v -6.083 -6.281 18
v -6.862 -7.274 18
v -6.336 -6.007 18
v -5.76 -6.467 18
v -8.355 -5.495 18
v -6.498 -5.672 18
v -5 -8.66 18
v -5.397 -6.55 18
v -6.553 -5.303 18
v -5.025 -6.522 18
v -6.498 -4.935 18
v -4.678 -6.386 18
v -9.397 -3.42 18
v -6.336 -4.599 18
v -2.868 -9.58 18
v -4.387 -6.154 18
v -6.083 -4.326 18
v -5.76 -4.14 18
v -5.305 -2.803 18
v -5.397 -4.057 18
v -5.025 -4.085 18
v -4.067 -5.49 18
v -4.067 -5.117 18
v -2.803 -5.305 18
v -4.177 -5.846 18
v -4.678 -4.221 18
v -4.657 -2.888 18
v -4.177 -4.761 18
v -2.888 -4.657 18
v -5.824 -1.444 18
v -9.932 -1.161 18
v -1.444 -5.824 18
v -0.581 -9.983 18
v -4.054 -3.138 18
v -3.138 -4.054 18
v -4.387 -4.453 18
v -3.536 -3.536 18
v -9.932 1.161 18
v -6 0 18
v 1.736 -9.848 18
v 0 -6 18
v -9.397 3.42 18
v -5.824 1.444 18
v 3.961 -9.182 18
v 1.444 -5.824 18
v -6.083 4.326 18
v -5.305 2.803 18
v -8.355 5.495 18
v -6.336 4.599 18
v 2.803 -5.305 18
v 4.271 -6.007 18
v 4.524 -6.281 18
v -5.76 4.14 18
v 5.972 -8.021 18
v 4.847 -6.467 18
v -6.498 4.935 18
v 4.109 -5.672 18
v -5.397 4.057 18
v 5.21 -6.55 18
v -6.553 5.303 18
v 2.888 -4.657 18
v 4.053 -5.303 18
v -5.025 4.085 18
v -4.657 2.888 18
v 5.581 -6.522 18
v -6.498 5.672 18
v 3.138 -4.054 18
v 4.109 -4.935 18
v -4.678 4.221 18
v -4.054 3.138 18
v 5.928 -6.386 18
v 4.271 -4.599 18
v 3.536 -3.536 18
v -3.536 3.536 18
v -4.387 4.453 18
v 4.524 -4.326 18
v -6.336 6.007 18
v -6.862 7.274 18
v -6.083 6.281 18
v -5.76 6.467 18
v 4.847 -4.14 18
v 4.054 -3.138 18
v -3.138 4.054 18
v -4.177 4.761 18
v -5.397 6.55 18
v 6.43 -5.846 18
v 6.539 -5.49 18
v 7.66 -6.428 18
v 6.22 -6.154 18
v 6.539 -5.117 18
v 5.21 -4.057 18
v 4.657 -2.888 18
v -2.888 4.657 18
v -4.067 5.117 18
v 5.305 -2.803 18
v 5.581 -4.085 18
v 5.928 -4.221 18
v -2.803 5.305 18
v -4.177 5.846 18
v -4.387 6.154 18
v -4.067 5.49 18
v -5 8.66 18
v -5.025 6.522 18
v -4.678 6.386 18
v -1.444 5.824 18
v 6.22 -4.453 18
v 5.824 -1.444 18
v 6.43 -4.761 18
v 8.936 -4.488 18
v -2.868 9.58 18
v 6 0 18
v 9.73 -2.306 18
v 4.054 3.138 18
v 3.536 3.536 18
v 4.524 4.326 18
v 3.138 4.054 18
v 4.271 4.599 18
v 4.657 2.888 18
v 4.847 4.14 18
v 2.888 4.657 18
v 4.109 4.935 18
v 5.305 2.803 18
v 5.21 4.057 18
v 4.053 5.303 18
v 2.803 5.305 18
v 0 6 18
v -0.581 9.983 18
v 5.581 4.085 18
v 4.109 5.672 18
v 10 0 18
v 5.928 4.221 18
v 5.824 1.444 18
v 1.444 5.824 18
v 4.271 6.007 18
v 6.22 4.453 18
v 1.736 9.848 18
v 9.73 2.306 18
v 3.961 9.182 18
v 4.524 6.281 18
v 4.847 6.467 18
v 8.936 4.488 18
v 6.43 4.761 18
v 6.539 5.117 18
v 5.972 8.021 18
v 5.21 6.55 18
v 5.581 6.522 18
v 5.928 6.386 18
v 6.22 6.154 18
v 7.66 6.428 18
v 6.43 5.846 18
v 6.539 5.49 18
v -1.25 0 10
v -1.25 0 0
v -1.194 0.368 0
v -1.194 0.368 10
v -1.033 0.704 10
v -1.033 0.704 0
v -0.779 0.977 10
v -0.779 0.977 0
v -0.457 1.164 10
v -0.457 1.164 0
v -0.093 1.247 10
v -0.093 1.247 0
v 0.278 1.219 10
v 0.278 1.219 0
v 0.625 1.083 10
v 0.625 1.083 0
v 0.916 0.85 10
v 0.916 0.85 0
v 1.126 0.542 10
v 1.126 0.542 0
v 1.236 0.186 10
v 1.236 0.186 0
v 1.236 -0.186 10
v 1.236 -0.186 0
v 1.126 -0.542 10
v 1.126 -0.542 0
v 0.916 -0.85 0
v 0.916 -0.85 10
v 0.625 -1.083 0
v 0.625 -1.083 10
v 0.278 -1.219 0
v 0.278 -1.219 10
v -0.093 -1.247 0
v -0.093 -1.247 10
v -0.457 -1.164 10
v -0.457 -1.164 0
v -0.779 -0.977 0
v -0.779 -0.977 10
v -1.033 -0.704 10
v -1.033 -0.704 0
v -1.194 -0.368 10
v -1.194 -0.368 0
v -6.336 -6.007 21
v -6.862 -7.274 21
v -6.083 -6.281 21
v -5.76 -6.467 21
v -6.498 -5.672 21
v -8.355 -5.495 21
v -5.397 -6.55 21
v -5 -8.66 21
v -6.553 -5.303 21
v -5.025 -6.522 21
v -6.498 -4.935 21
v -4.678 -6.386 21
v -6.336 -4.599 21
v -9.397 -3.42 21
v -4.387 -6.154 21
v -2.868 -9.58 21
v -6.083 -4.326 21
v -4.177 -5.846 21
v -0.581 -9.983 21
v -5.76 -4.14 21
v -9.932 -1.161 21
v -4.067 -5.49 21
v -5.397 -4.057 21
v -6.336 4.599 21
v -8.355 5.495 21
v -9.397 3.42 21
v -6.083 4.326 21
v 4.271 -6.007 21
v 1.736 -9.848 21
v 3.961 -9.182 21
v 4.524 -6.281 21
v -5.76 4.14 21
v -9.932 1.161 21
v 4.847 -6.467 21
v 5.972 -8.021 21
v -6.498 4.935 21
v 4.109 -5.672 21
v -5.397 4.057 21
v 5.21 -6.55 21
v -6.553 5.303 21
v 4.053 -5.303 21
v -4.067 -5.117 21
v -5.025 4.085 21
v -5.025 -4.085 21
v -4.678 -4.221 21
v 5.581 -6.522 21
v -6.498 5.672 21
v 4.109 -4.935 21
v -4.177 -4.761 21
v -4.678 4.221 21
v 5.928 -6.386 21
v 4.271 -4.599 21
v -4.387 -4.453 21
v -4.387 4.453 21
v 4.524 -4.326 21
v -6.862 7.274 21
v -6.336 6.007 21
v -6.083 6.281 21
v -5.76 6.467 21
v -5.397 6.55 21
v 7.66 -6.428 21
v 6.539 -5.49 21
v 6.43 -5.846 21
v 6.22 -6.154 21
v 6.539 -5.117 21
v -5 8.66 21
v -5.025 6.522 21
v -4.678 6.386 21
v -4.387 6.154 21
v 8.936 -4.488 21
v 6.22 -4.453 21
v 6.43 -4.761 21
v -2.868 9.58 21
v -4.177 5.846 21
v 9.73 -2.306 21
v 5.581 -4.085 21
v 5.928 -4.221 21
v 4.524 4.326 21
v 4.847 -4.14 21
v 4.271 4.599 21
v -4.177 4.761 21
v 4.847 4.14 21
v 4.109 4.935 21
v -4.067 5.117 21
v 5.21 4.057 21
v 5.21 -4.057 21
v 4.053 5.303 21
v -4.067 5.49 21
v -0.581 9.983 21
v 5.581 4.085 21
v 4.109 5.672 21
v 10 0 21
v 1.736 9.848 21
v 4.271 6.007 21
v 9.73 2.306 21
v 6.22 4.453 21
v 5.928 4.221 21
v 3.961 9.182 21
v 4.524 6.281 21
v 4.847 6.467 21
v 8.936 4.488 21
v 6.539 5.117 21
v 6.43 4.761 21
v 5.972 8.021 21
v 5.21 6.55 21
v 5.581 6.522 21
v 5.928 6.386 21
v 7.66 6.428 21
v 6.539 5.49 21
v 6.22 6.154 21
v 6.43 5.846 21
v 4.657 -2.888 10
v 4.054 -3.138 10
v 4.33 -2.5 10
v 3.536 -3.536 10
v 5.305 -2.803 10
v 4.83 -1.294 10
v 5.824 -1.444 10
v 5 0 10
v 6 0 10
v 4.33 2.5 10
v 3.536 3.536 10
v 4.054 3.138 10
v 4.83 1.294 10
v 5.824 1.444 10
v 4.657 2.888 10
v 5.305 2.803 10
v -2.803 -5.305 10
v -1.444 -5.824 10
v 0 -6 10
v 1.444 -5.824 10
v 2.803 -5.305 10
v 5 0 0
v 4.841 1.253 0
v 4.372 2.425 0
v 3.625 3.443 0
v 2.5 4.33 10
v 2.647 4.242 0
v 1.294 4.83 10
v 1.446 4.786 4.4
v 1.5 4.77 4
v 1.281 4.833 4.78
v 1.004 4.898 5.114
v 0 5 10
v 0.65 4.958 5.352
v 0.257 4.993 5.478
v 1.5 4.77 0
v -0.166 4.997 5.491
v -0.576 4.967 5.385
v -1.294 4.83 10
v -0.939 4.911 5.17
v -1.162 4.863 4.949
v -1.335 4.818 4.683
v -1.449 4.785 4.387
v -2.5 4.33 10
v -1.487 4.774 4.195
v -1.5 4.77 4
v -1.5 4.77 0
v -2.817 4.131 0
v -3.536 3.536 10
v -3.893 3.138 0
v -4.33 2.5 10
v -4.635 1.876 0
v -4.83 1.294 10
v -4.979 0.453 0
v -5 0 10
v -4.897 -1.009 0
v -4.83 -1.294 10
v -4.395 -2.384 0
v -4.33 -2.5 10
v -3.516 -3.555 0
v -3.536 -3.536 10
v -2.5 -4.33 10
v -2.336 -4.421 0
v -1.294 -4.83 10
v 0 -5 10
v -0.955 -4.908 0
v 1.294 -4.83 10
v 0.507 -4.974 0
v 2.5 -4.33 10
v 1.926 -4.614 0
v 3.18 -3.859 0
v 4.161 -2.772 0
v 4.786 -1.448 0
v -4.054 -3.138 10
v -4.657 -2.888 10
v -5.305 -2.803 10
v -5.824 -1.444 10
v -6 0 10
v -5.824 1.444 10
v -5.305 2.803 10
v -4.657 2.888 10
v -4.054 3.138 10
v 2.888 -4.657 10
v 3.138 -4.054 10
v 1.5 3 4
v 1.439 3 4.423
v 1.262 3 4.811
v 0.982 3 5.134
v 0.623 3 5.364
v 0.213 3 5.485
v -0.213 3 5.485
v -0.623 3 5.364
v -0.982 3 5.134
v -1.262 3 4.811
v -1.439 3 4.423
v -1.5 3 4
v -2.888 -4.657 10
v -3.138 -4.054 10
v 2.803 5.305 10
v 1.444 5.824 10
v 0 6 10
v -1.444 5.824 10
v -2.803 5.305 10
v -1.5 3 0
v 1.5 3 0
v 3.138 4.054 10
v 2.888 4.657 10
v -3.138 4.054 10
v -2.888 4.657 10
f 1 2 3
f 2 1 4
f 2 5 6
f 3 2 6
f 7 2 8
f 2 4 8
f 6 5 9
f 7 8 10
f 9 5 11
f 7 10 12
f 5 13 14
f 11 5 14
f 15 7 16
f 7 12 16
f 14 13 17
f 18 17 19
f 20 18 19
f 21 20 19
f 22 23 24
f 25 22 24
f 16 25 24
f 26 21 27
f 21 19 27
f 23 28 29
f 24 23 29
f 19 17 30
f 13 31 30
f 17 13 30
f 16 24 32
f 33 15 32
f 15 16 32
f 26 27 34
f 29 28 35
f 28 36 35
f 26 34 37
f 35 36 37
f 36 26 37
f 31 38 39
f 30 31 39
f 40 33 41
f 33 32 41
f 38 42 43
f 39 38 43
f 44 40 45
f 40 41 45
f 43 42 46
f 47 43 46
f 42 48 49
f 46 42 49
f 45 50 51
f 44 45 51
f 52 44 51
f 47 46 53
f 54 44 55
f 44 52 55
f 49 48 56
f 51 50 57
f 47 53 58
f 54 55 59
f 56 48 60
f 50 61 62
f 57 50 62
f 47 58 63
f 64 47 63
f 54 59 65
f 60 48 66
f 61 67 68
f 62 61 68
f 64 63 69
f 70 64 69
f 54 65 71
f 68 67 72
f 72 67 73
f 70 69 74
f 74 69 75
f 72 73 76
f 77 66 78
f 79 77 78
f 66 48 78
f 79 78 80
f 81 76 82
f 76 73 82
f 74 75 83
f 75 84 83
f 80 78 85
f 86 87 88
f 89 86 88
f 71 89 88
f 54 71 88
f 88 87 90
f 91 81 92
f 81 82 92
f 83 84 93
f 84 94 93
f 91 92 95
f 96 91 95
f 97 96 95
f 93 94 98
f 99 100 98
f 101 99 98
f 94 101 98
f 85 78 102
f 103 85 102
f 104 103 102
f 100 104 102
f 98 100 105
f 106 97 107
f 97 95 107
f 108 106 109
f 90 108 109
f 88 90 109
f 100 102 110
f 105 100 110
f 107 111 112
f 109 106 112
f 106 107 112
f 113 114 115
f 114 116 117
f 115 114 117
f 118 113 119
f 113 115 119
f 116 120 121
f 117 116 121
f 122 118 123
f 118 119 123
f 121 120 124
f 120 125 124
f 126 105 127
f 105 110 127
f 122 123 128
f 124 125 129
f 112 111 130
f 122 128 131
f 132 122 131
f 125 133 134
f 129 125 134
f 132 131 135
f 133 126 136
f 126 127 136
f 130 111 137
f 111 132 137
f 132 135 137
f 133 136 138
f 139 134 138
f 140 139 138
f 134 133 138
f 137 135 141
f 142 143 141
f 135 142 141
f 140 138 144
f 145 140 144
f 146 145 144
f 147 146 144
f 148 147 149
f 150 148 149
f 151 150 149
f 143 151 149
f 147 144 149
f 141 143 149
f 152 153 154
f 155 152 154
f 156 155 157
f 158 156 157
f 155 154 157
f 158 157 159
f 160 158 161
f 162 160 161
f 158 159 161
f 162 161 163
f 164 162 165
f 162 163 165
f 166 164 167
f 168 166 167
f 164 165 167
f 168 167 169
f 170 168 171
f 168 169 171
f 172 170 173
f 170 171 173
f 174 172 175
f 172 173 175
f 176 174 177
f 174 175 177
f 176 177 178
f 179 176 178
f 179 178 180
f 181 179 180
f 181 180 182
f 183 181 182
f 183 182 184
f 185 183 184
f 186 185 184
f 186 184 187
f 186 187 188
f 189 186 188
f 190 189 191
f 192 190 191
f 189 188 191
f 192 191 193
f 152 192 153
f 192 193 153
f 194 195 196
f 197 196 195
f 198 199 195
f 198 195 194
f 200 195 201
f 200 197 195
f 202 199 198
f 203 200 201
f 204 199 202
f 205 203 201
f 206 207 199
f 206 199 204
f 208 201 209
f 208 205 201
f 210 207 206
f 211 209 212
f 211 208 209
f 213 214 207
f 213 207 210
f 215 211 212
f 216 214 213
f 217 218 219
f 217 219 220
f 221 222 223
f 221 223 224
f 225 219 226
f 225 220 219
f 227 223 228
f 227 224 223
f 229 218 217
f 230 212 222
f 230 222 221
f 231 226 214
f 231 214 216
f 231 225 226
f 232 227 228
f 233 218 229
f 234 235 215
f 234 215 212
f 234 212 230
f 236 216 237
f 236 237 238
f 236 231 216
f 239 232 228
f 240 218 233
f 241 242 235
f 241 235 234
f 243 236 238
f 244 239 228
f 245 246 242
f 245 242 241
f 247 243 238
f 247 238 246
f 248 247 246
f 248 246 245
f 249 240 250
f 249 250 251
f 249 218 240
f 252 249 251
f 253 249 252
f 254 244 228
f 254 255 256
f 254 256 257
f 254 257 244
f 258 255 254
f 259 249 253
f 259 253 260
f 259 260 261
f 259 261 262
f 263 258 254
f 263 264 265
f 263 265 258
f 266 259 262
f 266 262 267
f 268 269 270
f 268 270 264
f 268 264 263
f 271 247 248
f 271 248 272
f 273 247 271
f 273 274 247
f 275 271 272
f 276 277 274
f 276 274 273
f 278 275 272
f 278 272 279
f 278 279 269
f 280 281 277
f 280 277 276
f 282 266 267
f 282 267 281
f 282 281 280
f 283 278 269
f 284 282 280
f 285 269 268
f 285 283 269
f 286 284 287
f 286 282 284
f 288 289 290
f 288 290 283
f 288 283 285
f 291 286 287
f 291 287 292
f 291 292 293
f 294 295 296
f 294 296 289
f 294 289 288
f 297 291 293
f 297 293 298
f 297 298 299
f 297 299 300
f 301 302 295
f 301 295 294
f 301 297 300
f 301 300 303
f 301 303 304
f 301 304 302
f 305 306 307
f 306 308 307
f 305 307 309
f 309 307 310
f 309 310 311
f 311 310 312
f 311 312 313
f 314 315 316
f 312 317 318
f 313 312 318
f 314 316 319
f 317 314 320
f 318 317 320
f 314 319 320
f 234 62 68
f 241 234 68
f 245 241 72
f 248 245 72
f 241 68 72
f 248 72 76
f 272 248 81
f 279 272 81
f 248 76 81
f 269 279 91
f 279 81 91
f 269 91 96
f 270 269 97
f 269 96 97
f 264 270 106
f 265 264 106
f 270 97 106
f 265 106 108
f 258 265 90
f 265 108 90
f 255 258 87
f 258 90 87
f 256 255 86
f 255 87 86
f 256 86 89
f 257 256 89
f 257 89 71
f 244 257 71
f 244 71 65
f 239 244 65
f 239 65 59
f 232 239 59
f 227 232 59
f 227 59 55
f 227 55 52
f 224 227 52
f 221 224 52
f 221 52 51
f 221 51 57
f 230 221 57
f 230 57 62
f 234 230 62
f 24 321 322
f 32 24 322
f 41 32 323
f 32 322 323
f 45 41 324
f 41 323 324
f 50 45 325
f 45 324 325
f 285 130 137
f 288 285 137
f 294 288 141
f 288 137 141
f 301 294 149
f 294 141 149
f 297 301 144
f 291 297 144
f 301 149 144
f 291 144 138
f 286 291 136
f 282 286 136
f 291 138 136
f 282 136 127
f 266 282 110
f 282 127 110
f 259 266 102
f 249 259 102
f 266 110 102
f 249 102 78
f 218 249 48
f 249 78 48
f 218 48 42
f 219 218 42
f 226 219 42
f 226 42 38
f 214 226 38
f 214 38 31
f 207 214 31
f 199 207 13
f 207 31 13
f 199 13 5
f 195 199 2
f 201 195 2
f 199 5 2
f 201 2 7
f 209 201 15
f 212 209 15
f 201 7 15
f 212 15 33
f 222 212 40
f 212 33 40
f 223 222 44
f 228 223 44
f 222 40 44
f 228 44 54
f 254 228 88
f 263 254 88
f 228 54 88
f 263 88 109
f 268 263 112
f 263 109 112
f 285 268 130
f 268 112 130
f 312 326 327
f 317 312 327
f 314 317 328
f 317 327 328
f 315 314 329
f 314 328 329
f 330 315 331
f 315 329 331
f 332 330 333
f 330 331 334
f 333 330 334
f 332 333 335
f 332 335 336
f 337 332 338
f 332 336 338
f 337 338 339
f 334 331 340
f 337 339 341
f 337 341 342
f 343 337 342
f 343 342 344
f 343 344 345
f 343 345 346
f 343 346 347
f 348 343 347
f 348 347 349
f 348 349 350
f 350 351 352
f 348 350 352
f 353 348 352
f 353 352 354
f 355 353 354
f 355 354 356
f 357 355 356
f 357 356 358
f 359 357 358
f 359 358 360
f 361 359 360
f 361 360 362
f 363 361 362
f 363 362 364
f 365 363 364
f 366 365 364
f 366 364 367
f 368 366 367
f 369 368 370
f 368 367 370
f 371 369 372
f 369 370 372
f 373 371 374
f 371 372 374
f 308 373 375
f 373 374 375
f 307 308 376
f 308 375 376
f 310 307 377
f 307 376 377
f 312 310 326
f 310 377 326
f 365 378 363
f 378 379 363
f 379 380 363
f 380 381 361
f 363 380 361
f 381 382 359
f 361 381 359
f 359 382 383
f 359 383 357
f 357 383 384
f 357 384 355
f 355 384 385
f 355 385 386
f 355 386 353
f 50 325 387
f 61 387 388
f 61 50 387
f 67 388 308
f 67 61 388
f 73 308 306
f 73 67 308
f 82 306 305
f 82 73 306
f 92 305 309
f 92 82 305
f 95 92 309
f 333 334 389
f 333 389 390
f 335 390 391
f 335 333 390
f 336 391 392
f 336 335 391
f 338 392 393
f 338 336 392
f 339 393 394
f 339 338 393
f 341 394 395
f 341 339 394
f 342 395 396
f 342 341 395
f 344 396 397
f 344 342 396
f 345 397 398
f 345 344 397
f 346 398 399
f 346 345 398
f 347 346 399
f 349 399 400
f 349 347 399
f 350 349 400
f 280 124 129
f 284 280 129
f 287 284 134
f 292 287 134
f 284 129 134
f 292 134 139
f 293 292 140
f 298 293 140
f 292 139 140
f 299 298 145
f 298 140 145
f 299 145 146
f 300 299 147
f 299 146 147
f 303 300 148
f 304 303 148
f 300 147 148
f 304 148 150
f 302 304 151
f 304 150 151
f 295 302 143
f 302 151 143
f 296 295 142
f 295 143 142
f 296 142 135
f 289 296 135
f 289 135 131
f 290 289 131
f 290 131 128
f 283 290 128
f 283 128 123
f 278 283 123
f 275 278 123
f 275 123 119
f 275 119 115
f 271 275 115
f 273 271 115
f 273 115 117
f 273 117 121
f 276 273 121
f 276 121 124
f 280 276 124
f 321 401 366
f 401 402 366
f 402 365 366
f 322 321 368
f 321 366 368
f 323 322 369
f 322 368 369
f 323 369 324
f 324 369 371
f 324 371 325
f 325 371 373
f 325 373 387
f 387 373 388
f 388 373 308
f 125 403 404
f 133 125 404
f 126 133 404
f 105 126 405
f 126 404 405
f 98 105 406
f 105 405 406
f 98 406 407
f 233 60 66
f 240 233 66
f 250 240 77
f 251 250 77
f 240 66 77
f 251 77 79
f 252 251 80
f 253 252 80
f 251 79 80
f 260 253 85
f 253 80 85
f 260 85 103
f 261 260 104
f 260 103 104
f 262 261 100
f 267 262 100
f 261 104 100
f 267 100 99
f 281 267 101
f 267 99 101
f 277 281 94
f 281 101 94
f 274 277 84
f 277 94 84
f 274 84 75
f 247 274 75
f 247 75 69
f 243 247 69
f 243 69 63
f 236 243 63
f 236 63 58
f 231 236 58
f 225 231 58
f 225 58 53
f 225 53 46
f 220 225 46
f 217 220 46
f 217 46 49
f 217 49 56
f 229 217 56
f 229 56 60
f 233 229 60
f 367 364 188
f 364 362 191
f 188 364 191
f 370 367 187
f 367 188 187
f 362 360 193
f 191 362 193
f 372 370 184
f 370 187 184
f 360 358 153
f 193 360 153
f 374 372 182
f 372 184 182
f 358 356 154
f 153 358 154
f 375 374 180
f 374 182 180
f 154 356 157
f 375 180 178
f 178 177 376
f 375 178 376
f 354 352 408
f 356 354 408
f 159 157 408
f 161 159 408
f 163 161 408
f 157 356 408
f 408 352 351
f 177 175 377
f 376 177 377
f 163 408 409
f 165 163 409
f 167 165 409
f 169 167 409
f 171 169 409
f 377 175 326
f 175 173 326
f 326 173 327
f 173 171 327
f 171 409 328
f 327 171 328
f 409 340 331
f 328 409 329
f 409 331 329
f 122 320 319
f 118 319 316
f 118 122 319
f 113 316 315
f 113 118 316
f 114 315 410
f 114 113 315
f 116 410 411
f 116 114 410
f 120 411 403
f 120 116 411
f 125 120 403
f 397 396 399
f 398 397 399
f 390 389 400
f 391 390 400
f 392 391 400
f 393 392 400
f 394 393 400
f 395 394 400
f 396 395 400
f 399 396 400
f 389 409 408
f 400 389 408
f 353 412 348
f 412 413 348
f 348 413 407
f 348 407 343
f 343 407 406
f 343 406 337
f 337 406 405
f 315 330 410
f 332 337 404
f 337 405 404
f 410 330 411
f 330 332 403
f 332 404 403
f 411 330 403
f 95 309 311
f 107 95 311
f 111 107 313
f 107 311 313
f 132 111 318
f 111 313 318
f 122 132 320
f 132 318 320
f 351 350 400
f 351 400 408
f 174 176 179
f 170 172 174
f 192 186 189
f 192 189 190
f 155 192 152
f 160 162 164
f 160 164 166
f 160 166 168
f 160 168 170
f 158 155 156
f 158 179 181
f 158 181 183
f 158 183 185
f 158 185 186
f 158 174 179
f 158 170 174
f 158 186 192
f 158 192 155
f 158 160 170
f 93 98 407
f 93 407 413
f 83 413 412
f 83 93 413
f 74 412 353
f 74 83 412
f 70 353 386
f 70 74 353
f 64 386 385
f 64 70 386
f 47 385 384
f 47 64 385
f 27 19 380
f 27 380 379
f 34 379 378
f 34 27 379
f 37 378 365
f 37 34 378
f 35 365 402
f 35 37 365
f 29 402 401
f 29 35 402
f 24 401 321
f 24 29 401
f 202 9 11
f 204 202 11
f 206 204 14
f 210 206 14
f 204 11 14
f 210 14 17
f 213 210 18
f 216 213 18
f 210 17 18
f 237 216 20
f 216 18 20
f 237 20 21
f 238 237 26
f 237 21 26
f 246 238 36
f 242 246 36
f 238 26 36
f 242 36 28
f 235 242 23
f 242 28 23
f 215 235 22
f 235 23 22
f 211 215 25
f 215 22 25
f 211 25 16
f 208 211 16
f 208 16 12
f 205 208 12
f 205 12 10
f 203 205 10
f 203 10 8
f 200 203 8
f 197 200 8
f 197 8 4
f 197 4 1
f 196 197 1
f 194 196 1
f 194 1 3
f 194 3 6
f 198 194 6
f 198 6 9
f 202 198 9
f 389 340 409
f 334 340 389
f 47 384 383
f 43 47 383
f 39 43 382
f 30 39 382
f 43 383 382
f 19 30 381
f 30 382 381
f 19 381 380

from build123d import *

# Parameters (mm, degrees)
SKETCH_1_R          = 5
EXTRUDE_1_DEPTH     = 10
CUT_EXTRUDE_1_DEPTH = 2
SKETCH_3_R          = 6
EXTRUDE_2_DEPTH     = 8
SKETCH_4_R          = 1.25
CUT_EXTRUDE_2_DEPTH = 10
SKETCH_6_R          = 10
EXTRUDE_3_DEPTH     = 3
CUT_EXTRUDE_4_REACH = 24.891
SKETCH_7_R          = 1.25
CUT_EXTRUDE_5_REACH = 24.891
SKETCH_11_R         = 2.5


with BuildPart() as part:
    # 草图1 → 凸台-拉伸1 (new body)
    with BuildSketch(Plane.XY):
        Circle(SKETCH_1_R)
    extrude(amount=EXTRUDE_1_DEPTH)

    # 草图2 → 切除-拉伸1 (cut)
    with BuildSketch(Plane(origin=(0, 5, 0), x_dir=(1, 0, 0), z_dir=(0, 1, 0))):
        with BuildLine():
            Line((-1.5, -4), (-1.5, 0))
            Line((-1.5, 0), (1.5, 0))
            Line((1.5, 0), (1.5, -4))
            ThreePointArc((1.5, -4), (0, -5.5), (-1.5, -4))
        make_face()
    extrude(amount=-CUT_EXTRUDE_1_DEPTH, mode=Mode.SUBTRACT)

    # 草图3 → 凸台-拉伸2 (add)
    with BuildSketch(Plane.XY.offset(10)):
        Circle(SKETCH_3_R)
    extrude(amount=EXTRUDE_2_DEPTH)

    # 草图4 → 切除-拉伸2 (cut)
    with BuildSketch(Plane(origin=(0, 0, 0), x_dir=(-1, 0, 0), z_dir=(0, 0, -1))):
        Circle(SKETCH_4_R)
    extrude(amount=-CUT_EXTRUDE_2_DEPTH, mode=Mode.SUBTRACT)

    # 草图6 → 凸台-拉伸3 (add)
    with BuildSketch(Plane.XY.offset(18)):
        Circle(SKETCH_6_R)
    extrude(amount=EXTRUDE_3_DEPTH)

    # 草图7 → 切除-拉伸4 (cut, up to next)
    with BuildSketch(Plane(origin=(0, 0, 18), x_dir=(-1, 0, 0), z_dir=(0, 0, -1)), mode=Mode.PRIVATE) as cut_extrude_4_sk1:
        with Locations((5.303300859, 5.303300859)):
            Circle(SKETCH_7_R)
    cut_extrude_4_tool1 = extrude(cut_extrude_4_sk1.sketch, amount=-CUT_EXTRUDE_4_REACH, mode=Mode.PRIVATE) & part.part
    # 草图7 → 切除-拉伸4 (cut, up to next)
    with BuildSketch(Plane(origin=(0, 0, 18), x_dir=(-1, 0, 0), z_dir=(0, 0, -1)), mode=Mode.PRIVATE) as cut_extrude_4_sk2:
        with Locations((-5.303300859, 5.303300859)):
            Circle(SKETCH_7_R)
    cut_extrude_4_tool2 = extrude(cut_extrude_4_sk2.sketch, amount=-CUT_EXTRUDE_4_REACH, mode=Mode.PRIVATE) & part.part
    # 草图7 → 切除-拉伸4 (cut, up to next)
    with BuildSketch(Plane(origin=(0, 0, 18), x_dir=(-1, 0, 0), z_dir=(0, 0, -1)), mode=Mode.PRIVATE) as cut_extrude_4_sk3:
        with Locations((-5.303300859, -5.303300859)):
            Circle(SKETCH_7_R)
    cut_extrude_4_tool3 = extrude(cut_extrude_4_sk3.sketch, amount=-CUT_EXTRUDE_4_REACH, mode=Mode.PRIVATE) & part.part
    # 草图7 → 切除-拉伸4 (cut, up to next)
    with BuildSketch(Plane(origin=(0, 0, 18), x_dir=(-1, 0, 0), z_dir=(0, 0, -1)), mode=Mode.PRIVATE) as cut_extrude_4_sk4:
        with Locations((5.303300859, -5.303300859)):
            Circle(SKETCH_7_R)
    cut_extrude_4_tool4 = extrude(cut_extrude_4_sk4.sketch, amount=-CUT_EXTRUDE_4_REACH, mode=Mode.PRIVATE) & part.part
    add(cut_extrude_4_tool1.solids().sort_by_distance((-5.303301, 5.303301, 18))[0], mode=Mode.SUBTRACT)
    add(cut_extrude_4_tool2.solids().sort_by_distance((5.303301, 5.303301, 18))[0], mode=Mode.SUBTRACT)
    add(cut_extrude_4_tool3.solids().sort_by_distance((5.303301, -5.303301, 18))[0], mode=Mode.SUBTRACT)
    add(cut_extrude_4_tool4.solids().sort_by_distance((-5.303301, -5.303301, 18))[0], mode=Mode.SUBTRACT)

    # 草图11 → 切除-拉伸5 (cut, up to next)
    with BuildSketch(Plane(origin=(0, 0, 18), x_dir=(-1, 0, 0), z_dir=(0, 0, -1)), mode=Mode.PRIVATE) as cut_extrude_5_sk1:
        with Locations((5.303300859, 5.303300859)):
            Circle(SKETCH_11_R)
    cut_extrude_5_tool1 = extrude(cut_extrude_5_sk1.sketch, amount=CUT_EXTRUDE_5_REACH, mode=Mode.PRIVATE) & part.part
    # 草图11 → 切除-拉伸5 (cut, up to next)
    with BuildSketch(Plane(origin=(0, 0, 18), x_dir=(-1, 0, 0), z_dir=(0, 0, -1)), mode=Mode.PRIVATE) as cut_extrude_5_sk2:
        with Locations((-5.303300859, 5.303300859)):
            Circle(SKETCH_11_R)
    cut_extrude_5_tool2 = extrude(cut_extrude_5_sk2.sketch, amount=CUT_EXTRUDE_5_REACH, mode=Mode.PRIVATE) & part.part
    # 草图11 → 切除-拉伸5 (cut, up to next)
    with BuildSketch(Plane(origin=(0, 0, 18), x_dir=(-1, 0, 0), z_dir=(0, 0, -1)), mode=Mode.PRIVATE) as cut_extrude_5_sk3:
        with Locations((-5.303300859, -5.303300859)):
            Circle(SKETCH_11_R)
    cut_extrude_5_tool3 = extrude(cut_extrude_5_sk3.sketch, amount=CUT_EXTRUDE_5_REACH, mode=Mode.PRIVATE) & part.part
    # 草图11 → 切除-拉伸5 (cut, up to next)
    with BuildSketch(Plane(origin=(0, 0, 18), x_dir=(-1, 0, 0), z_dir=(0, 0, -1)), mode=Mode.PRIVATE) as cut_extrude_5_sk4:
        with Locations((5.303300859, -5.303300859)):
            Circle(SKETCH_11_R)
    cut_extrude_5_tool4 = extrude(cut_extrude_5_sk4.sketch, amount=CUT_EXTRUDE_5_REACH, mode=Mode.PRIVATE) & part.part
    add(cut_extrude_5_tool1.solids().sort_by_distance((-5.303301, 5.303301, 18))[0], mode=Mode.SUBTRACT)
    add(cut_extrude_5_tool2.solids().sort_by_distance((5.303301, 5.303301, 18))[0], mode=Mode.SUBTRACT)
    add(cut_extrude_5_tool3.solids().sort_by_distance((5.303301, -5.303301, 18))[0], mode=Mode.SUBTRACT)
    add(cut_extrude_5_tool4.solids().sort_by_distance((-5.303301, -5.303301, 18))[0], mode=Mode.SUBTRACT)


solid = part.part
